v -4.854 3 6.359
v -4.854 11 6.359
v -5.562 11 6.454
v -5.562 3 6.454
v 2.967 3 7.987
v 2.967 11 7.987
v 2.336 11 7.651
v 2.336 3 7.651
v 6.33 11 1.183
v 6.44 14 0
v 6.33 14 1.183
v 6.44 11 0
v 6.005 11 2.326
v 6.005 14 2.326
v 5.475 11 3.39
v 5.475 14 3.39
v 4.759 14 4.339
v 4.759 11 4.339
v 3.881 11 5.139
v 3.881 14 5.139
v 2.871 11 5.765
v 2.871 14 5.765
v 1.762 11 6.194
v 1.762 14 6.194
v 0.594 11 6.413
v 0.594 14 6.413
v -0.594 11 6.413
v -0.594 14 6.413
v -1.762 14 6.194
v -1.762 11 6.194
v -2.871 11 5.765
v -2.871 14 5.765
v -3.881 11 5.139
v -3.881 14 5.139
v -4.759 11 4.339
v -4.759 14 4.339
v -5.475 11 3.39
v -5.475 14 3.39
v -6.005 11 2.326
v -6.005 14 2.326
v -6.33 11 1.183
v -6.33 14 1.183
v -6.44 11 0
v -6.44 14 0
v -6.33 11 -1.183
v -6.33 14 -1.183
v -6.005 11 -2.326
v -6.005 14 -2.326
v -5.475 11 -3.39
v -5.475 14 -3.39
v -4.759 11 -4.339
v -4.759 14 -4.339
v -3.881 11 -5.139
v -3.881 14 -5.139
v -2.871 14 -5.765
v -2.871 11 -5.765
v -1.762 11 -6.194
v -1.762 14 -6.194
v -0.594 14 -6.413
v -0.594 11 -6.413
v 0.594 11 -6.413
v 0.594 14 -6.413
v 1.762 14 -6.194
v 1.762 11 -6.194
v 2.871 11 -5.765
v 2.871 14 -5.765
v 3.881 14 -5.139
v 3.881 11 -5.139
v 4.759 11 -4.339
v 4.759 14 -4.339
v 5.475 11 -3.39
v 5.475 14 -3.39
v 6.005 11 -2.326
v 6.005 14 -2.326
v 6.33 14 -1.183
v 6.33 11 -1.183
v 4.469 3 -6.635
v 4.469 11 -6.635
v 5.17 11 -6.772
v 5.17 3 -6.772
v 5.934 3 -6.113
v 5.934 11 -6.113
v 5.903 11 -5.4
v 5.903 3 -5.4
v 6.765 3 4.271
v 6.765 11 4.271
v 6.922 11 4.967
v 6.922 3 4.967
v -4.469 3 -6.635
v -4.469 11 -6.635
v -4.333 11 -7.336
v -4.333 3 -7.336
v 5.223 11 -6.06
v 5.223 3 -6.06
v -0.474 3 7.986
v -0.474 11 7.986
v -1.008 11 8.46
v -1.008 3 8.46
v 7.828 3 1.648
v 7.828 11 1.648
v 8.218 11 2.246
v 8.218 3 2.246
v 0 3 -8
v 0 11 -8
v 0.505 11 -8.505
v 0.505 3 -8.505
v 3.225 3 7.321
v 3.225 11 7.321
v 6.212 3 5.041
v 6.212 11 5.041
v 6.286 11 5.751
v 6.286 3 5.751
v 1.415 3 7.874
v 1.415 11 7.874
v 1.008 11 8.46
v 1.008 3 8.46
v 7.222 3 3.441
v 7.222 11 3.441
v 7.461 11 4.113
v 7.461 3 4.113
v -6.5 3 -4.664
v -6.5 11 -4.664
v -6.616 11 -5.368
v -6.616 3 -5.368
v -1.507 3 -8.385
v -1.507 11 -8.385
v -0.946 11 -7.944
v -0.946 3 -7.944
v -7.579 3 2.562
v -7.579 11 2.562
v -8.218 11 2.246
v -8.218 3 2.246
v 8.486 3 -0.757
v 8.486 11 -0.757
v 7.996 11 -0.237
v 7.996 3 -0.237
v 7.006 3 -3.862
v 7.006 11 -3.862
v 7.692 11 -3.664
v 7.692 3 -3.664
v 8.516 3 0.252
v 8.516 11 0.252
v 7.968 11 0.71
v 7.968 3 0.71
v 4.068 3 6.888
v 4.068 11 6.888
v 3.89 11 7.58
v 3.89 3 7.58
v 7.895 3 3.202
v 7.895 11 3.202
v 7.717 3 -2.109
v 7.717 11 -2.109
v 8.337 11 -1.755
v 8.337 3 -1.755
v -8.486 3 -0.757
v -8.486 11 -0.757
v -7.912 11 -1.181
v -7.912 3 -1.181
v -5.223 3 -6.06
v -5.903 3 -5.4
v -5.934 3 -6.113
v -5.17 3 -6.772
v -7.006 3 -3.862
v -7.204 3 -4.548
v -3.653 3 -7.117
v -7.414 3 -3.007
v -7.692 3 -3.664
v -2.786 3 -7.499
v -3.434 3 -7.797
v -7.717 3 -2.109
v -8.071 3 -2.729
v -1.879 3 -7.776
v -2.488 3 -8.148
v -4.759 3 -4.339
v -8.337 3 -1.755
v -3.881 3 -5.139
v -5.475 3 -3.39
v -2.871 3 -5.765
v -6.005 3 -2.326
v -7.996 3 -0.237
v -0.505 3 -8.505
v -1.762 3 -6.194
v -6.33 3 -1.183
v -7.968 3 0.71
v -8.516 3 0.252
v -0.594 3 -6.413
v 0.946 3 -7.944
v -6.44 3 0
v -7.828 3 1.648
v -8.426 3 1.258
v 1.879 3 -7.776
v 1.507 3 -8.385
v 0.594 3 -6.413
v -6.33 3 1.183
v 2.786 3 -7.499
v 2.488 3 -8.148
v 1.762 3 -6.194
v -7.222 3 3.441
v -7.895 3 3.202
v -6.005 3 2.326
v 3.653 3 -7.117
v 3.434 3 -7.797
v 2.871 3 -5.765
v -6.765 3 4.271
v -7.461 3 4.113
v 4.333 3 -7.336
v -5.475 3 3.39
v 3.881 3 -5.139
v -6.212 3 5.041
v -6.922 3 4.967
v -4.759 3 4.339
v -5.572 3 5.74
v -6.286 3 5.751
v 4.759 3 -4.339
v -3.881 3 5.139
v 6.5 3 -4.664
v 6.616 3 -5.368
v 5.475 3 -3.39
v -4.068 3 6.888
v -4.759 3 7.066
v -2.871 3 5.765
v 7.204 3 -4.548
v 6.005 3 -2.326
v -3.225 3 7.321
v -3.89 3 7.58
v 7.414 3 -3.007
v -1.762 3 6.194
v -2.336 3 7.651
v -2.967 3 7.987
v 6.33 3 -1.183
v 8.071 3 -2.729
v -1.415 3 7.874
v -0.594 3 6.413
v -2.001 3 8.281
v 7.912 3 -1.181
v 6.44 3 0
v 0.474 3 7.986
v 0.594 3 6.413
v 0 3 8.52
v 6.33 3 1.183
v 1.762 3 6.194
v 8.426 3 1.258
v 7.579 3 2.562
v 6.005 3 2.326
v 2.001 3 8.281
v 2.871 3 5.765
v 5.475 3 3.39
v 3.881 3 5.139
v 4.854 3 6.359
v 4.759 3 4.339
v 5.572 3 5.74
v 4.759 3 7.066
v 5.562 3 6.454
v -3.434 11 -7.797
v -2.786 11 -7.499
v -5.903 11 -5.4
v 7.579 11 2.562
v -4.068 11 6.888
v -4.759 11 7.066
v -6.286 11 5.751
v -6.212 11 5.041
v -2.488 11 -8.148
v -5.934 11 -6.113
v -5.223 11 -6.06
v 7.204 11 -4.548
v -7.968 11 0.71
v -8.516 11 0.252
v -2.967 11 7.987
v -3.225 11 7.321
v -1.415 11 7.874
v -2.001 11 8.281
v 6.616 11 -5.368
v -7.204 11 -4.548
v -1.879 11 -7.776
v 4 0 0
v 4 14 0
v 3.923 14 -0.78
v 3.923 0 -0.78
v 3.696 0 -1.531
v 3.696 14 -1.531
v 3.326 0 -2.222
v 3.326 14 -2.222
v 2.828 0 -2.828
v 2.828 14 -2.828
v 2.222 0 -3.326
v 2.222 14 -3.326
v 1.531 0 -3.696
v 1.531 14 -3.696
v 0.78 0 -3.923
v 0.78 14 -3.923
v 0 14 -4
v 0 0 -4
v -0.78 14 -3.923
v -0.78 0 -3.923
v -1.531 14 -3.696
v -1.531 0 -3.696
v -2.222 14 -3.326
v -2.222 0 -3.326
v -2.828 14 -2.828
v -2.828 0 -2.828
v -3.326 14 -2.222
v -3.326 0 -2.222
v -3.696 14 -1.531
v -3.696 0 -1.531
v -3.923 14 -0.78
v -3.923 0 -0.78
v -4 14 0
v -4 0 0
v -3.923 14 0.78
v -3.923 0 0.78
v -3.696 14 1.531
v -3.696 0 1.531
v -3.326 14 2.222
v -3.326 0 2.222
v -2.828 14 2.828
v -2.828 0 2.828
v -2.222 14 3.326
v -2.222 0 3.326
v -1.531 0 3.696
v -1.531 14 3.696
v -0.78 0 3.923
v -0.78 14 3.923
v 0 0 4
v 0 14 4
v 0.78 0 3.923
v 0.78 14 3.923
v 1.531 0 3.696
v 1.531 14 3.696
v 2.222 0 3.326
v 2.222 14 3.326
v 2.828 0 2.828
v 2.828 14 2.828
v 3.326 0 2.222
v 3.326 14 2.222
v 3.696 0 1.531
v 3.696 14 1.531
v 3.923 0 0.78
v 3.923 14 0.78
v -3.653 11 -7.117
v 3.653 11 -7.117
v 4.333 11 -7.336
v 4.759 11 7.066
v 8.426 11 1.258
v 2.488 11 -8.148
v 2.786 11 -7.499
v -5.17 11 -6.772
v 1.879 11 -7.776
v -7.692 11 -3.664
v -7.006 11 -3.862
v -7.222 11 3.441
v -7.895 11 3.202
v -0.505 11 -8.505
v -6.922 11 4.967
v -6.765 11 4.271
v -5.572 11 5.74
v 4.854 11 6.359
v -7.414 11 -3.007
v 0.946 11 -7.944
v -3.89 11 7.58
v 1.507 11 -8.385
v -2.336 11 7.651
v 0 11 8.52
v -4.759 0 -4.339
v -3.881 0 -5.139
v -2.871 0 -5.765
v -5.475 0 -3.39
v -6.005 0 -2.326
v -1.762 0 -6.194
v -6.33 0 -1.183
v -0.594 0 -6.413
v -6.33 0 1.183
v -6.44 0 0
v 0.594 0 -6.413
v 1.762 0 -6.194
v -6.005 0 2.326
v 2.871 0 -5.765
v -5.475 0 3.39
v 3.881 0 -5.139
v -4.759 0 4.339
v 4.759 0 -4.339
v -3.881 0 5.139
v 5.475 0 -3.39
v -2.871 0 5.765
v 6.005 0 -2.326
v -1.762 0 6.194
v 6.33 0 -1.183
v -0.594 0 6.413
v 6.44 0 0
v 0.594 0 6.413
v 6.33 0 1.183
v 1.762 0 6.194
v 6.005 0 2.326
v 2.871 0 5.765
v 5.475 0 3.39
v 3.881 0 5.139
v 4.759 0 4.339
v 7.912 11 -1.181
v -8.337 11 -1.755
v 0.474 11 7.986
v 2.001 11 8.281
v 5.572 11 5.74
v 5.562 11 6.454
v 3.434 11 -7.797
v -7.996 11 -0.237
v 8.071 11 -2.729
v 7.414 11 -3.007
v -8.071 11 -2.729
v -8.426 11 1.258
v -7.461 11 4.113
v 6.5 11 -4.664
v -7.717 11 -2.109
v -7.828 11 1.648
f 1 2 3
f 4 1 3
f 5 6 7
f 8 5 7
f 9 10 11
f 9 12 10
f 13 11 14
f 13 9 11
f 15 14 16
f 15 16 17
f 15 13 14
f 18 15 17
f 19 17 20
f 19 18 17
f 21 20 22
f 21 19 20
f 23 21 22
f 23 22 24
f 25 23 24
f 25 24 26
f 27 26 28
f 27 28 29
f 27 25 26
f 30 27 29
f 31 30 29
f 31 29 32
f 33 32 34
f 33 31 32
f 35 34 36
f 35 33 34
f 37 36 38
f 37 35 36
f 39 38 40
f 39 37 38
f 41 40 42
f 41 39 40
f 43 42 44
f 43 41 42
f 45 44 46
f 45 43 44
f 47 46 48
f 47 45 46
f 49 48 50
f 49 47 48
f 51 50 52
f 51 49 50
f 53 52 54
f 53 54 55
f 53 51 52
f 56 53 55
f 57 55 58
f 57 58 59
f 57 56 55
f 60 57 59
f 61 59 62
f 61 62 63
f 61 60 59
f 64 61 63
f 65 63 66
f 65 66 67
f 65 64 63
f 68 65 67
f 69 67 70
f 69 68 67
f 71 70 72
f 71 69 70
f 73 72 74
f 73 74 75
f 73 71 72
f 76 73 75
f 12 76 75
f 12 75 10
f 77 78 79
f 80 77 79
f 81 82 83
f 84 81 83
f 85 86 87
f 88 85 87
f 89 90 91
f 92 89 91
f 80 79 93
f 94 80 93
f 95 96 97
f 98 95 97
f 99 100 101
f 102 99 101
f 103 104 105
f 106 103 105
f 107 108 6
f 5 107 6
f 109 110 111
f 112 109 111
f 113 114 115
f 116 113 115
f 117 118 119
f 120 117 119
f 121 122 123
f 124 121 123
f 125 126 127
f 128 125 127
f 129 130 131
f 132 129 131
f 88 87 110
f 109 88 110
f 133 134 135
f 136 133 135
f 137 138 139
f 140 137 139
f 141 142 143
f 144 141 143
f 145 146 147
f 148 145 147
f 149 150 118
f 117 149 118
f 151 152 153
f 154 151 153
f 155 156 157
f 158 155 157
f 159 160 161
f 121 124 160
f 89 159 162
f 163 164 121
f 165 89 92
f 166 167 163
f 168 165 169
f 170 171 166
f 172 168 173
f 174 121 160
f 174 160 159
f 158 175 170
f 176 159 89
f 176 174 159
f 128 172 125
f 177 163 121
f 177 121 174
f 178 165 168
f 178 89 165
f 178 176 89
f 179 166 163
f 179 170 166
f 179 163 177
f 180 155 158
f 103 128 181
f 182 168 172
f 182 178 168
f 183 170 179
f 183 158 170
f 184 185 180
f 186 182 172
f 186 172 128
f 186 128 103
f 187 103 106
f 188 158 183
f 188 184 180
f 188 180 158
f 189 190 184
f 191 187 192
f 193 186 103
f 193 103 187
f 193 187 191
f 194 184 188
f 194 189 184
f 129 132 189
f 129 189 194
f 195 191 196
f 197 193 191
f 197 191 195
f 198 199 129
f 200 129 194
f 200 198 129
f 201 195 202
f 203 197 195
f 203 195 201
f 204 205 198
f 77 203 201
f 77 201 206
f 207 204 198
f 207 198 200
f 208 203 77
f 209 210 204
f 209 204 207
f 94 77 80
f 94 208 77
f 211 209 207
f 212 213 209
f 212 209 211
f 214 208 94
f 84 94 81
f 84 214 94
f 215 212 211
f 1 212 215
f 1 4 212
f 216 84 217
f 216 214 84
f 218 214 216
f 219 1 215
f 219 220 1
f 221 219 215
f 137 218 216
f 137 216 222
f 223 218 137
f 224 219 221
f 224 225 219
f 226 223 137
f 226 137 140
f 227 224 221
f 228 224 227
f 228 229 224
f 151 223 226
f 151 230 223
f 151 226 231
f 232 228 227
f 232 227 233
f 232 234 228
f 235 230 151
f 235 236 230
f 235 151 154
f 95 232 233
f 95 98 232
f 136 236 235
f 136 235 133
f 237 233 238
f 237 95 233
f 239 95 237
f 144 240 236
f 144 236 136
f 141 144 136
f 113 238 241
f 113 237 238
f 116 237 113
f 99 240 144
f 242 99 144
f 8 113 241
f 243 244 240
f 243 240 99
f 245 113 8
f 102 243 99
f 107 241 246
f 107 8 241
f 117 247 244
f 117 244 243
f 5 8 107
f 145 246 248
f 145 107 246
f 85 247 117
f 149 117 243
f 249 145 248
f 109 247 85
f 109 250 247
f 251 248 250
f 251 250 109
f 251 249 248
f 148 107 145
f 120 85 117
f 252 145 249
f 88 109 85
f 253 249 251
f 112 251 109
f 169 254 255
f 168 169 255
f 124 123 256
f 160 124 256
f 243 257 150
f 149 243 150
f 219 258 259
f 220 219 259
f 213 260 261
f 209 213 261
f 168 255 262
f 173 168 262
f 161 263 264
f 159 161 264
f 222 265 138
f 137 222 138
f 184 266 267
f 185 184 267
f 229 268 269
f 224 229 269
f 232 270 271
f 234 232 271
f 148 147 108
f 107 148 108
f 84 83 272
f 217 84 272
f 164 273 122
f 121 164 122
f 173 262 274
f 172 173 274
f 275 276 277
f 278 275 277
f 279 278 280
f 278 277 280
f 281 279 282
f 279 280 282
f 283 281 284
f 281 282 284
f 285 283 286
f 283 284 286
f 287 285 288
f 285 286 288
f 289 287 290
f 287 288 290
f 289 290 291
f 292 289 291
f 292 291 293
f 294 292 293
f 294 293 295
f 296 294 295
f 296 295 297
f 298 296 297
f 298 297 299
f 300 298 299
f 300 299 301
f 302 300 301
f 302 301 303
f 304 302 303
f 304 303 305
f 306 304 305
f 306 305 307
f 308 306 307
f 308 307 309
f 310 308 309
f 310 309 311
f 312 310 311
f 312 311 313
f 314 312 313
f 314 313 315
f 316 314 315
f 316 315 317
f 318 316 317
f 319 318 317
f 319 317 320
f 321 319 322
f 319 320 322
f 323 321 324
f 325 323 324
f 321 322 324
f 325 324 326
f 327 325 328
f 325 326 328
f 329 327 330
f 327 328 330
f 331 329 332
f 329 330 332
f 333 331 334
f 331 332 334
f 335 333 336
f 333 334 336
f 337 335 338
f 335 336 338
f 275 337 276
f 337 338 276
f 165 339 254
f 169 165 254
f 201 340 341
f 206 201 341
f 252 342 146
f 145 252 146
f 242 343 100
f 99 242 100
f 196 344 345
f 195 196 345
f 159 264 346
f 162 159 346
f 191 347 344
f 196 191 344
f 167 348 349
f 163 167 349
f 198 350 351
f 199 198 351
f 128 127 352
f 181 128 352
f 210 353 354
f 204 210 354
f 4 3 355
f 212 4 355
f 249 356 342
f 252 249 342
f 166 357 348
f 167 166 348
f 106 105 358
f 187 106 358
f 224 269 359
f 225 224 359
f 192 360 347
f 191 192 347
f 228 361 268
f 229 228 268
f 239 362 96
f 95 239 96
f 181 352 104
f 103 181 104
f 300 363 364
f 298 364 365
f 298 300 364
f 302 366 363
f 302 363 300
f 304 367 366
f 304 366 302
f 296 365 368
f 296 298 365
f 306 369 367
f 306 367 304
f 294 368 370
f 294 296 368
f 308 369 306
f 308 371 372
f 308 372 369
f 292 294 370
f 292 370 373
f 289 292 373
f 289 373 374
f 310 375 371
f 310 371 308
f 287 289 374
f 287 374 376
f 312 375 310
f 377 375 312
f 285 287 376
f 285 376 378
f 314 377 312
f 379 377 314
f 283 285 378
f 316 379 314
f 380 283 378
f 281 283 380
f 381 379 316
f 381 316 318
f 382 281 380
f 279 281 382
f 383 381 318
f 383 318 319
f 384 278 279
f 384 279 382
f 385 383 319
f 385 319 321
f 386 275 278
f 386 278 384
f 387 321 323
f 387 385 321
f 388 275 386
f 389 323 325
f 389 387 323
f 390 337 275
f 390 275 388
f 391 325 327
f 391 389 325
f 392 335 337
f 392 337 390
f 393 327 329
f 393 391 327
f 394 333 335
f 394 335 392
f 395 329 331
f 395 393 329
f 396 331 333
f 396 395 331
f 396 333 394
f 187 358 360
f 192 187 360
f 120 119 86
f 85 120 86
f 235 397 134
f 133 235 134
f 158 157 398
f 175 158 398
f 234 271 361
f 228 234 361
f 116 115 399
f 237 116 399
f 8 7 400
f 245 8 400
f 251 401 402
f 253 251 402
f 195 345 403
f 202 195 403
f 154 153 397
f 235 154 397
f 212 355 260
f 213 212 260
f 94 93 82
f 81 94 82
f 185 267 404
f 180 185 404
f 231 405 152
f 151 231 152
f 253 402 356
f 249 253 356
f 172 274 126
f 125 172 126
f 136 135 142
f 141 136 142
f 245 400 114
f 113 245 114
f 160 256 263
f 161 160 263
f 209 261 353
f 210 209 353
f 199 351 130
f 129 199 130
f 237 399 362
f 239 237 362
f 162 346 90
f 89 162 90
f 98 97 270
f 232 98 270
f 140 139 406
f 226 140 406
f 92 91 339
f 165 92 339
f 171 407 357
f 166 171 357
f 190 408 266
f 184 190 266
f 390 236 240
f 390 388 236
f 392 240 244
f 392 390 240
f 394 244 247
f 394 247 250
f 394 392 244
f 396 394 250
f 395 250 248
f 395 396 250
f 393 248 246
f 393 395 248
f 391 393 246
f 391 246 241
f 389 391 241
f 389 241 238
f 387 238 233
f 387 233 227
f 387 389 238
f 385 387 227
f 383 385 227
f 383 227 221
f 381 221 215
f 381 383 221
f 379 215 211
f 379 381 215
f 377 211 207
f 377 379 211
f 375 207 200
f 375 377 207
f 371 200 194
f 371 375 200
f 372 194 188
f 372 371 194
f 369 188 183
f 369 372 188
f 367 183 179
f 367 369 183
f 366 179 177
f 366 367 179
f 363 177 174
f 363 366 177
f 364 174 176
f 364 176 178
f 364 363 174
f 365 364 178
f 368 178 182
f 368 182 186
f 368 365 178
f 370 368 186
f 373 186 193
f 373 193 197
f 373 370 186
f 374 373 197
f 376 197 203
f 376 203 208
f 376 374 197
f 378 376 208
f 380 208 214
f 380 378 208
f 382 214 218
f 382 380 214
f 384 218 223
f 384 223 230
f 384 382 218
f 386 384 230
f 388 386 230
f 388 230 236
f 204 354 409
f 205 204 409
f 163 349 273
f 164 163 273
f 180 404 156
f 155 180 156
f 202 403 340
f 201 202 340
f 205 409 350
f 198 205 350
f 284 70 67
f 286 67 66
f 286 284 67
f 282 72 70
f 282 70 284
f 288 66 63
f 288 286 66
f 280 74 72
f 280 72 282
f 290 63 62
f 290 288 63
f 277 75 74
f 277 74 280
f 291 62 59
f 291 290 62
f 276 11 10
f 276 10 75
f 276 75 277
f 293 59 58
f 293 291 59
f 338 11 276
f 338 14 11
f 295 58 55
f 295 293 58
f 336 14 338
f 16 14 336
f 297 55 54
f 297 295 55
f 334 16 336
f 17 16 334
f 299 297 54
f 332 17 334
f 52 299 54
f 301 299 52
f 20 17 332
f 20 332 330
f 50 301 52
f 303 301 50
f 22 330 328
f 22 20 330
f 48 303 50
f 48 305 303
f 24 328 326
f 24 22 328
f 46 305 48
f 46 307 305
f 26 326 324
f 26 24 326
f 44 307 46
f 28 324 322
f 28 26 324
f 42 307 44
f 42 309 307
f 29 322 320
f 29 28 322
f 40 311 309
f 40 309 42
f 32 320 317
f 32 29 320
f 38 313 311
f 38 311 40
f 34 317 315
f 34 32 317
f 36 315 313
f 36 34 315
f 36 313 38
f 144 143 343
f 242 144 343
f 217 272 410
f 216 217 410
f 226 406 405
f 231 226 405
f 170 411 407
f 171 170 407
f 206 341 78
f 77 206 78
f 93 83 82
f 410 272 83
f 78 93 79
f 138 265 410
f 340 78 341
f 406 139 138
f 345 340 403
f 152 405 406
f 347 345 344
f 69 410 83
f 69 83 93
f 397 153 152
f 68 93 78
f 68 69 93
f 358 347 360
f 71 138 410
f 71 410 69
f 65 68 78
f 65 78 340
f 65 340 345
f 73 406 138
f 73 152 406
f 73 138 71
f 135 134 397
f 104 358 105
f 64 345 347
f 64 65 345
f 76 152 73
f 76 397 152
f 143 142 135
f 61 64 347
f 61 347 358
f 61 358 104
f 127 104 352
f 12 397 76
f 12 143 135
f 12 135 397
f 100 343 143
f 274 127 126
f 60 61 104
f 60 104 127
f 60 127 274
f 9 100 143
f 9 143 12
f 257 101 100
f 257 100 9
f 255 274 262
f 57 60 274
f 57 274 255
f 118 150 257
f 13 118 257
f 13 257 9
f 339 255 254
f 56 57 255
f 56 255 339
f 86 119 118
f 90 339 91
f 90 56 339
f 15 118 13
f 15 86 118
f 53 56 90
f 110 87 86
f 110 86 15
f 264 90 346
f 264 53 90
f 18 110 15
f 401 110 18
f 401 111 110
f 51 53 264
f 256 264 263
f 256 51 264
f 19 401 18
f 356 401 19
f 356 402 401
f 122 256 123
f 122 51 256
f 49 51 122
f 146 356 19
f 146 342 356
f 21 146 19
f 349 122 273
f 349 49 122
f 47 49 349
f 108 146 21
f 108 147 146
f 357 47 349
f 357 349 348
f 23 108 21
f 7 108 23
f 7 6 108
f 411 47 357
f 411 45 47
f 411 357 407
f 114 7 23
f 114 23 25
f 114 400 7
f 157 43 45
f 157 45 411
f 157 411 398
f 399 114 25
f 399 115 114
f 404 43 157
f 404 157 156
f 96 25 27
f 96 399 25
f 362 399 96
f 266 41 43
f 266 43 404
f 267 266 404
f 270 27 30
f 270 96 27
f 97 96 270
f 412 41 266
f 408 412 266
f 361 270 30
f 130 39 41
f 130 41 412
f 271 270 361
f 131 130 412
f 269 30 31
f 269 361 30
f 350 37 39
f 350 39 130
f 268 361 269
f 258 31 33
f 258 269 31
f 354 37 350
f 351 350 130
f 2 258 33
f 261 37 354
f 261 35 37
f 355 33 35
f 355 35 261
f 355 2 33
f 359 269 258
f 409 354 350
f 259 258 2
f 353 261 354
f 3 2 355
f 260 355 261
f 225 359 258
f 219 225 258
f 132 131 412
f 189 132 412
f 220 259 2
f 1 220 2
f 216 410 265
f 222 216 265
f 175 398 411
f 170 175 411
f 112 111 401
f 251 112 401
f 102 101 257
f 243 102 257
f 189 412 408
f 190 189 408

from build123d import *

# Parameters (mm, degrees)
CUT_EXTRUDE_2_DEPTH      = 12
PATTERN_CIRCULAR_1_COUNT = 53
SKETCH_4_R               = 4
CUT_EXTRUDE_3_DEPTH      = 18


with BuildPart() as part:
    # 草图1 → 旋转1 (revolve)
    with BuildSketch(Plane.XY):
        Polygon((0, 17), (4, 17), (4, 14), (6.44, 14), (6.44, 11), (9.5, 11), (9.5, 3), (6.44, 3), (6.44, 0), (0, 0), align=None)
    revolve(axis=Axis((0, 17, 0), (0, -1, 0)))

    # 草图2 → 切除-拉伸2 (cut, through all)
    with BuildSketch(Plane(origin=(0, 11, 0), x_dir=(1, 0, 0), z_dir=(0, 1, 0))):
        with BuildLine():
            Line((0, 8), (1.396758286, 9.396758286))
            ThreePointArc((1.396758286, 9.396758286), (0, 9.5), (-1.396758286, 9.396758286))
            Line((-1.396758286, 9.396758286), (0, 8))
        make_face()
    cut_extrude_2 = extrude(amount=-CUT_EXTRUDE_2_DEPTH, mode=Mode.SUBTRACT)

    # 阵列(圆周)1: 切除-拉伸2 ×53 about axis
    pattern_circular_1_axis = Axis((0, 0, 0), (0, 1, 0))
    for i in range(1, PATTERN_CIRCULAR_1_COUNT):
        add(cut_extrude_2.rotate(pattern_circular_1_axis, i * 360 / PATTERN_CIRCULAR_1_COUNT), mode=Mode.SUBTRACT)

    # 草图4 → 切除-拉伸3 (cut, through all)
    with BuildSketch(Plane(origin=(0, 17, 0), x_dir=(1, 0, 0), z_dir=(0, 1, 0))):
        Circle(SKETCH_4_R)
    extrude(amount=-CUT_EXTRUDE_3_DEPTH, mode=Mode.SUBTRACT)


solid = part.part
